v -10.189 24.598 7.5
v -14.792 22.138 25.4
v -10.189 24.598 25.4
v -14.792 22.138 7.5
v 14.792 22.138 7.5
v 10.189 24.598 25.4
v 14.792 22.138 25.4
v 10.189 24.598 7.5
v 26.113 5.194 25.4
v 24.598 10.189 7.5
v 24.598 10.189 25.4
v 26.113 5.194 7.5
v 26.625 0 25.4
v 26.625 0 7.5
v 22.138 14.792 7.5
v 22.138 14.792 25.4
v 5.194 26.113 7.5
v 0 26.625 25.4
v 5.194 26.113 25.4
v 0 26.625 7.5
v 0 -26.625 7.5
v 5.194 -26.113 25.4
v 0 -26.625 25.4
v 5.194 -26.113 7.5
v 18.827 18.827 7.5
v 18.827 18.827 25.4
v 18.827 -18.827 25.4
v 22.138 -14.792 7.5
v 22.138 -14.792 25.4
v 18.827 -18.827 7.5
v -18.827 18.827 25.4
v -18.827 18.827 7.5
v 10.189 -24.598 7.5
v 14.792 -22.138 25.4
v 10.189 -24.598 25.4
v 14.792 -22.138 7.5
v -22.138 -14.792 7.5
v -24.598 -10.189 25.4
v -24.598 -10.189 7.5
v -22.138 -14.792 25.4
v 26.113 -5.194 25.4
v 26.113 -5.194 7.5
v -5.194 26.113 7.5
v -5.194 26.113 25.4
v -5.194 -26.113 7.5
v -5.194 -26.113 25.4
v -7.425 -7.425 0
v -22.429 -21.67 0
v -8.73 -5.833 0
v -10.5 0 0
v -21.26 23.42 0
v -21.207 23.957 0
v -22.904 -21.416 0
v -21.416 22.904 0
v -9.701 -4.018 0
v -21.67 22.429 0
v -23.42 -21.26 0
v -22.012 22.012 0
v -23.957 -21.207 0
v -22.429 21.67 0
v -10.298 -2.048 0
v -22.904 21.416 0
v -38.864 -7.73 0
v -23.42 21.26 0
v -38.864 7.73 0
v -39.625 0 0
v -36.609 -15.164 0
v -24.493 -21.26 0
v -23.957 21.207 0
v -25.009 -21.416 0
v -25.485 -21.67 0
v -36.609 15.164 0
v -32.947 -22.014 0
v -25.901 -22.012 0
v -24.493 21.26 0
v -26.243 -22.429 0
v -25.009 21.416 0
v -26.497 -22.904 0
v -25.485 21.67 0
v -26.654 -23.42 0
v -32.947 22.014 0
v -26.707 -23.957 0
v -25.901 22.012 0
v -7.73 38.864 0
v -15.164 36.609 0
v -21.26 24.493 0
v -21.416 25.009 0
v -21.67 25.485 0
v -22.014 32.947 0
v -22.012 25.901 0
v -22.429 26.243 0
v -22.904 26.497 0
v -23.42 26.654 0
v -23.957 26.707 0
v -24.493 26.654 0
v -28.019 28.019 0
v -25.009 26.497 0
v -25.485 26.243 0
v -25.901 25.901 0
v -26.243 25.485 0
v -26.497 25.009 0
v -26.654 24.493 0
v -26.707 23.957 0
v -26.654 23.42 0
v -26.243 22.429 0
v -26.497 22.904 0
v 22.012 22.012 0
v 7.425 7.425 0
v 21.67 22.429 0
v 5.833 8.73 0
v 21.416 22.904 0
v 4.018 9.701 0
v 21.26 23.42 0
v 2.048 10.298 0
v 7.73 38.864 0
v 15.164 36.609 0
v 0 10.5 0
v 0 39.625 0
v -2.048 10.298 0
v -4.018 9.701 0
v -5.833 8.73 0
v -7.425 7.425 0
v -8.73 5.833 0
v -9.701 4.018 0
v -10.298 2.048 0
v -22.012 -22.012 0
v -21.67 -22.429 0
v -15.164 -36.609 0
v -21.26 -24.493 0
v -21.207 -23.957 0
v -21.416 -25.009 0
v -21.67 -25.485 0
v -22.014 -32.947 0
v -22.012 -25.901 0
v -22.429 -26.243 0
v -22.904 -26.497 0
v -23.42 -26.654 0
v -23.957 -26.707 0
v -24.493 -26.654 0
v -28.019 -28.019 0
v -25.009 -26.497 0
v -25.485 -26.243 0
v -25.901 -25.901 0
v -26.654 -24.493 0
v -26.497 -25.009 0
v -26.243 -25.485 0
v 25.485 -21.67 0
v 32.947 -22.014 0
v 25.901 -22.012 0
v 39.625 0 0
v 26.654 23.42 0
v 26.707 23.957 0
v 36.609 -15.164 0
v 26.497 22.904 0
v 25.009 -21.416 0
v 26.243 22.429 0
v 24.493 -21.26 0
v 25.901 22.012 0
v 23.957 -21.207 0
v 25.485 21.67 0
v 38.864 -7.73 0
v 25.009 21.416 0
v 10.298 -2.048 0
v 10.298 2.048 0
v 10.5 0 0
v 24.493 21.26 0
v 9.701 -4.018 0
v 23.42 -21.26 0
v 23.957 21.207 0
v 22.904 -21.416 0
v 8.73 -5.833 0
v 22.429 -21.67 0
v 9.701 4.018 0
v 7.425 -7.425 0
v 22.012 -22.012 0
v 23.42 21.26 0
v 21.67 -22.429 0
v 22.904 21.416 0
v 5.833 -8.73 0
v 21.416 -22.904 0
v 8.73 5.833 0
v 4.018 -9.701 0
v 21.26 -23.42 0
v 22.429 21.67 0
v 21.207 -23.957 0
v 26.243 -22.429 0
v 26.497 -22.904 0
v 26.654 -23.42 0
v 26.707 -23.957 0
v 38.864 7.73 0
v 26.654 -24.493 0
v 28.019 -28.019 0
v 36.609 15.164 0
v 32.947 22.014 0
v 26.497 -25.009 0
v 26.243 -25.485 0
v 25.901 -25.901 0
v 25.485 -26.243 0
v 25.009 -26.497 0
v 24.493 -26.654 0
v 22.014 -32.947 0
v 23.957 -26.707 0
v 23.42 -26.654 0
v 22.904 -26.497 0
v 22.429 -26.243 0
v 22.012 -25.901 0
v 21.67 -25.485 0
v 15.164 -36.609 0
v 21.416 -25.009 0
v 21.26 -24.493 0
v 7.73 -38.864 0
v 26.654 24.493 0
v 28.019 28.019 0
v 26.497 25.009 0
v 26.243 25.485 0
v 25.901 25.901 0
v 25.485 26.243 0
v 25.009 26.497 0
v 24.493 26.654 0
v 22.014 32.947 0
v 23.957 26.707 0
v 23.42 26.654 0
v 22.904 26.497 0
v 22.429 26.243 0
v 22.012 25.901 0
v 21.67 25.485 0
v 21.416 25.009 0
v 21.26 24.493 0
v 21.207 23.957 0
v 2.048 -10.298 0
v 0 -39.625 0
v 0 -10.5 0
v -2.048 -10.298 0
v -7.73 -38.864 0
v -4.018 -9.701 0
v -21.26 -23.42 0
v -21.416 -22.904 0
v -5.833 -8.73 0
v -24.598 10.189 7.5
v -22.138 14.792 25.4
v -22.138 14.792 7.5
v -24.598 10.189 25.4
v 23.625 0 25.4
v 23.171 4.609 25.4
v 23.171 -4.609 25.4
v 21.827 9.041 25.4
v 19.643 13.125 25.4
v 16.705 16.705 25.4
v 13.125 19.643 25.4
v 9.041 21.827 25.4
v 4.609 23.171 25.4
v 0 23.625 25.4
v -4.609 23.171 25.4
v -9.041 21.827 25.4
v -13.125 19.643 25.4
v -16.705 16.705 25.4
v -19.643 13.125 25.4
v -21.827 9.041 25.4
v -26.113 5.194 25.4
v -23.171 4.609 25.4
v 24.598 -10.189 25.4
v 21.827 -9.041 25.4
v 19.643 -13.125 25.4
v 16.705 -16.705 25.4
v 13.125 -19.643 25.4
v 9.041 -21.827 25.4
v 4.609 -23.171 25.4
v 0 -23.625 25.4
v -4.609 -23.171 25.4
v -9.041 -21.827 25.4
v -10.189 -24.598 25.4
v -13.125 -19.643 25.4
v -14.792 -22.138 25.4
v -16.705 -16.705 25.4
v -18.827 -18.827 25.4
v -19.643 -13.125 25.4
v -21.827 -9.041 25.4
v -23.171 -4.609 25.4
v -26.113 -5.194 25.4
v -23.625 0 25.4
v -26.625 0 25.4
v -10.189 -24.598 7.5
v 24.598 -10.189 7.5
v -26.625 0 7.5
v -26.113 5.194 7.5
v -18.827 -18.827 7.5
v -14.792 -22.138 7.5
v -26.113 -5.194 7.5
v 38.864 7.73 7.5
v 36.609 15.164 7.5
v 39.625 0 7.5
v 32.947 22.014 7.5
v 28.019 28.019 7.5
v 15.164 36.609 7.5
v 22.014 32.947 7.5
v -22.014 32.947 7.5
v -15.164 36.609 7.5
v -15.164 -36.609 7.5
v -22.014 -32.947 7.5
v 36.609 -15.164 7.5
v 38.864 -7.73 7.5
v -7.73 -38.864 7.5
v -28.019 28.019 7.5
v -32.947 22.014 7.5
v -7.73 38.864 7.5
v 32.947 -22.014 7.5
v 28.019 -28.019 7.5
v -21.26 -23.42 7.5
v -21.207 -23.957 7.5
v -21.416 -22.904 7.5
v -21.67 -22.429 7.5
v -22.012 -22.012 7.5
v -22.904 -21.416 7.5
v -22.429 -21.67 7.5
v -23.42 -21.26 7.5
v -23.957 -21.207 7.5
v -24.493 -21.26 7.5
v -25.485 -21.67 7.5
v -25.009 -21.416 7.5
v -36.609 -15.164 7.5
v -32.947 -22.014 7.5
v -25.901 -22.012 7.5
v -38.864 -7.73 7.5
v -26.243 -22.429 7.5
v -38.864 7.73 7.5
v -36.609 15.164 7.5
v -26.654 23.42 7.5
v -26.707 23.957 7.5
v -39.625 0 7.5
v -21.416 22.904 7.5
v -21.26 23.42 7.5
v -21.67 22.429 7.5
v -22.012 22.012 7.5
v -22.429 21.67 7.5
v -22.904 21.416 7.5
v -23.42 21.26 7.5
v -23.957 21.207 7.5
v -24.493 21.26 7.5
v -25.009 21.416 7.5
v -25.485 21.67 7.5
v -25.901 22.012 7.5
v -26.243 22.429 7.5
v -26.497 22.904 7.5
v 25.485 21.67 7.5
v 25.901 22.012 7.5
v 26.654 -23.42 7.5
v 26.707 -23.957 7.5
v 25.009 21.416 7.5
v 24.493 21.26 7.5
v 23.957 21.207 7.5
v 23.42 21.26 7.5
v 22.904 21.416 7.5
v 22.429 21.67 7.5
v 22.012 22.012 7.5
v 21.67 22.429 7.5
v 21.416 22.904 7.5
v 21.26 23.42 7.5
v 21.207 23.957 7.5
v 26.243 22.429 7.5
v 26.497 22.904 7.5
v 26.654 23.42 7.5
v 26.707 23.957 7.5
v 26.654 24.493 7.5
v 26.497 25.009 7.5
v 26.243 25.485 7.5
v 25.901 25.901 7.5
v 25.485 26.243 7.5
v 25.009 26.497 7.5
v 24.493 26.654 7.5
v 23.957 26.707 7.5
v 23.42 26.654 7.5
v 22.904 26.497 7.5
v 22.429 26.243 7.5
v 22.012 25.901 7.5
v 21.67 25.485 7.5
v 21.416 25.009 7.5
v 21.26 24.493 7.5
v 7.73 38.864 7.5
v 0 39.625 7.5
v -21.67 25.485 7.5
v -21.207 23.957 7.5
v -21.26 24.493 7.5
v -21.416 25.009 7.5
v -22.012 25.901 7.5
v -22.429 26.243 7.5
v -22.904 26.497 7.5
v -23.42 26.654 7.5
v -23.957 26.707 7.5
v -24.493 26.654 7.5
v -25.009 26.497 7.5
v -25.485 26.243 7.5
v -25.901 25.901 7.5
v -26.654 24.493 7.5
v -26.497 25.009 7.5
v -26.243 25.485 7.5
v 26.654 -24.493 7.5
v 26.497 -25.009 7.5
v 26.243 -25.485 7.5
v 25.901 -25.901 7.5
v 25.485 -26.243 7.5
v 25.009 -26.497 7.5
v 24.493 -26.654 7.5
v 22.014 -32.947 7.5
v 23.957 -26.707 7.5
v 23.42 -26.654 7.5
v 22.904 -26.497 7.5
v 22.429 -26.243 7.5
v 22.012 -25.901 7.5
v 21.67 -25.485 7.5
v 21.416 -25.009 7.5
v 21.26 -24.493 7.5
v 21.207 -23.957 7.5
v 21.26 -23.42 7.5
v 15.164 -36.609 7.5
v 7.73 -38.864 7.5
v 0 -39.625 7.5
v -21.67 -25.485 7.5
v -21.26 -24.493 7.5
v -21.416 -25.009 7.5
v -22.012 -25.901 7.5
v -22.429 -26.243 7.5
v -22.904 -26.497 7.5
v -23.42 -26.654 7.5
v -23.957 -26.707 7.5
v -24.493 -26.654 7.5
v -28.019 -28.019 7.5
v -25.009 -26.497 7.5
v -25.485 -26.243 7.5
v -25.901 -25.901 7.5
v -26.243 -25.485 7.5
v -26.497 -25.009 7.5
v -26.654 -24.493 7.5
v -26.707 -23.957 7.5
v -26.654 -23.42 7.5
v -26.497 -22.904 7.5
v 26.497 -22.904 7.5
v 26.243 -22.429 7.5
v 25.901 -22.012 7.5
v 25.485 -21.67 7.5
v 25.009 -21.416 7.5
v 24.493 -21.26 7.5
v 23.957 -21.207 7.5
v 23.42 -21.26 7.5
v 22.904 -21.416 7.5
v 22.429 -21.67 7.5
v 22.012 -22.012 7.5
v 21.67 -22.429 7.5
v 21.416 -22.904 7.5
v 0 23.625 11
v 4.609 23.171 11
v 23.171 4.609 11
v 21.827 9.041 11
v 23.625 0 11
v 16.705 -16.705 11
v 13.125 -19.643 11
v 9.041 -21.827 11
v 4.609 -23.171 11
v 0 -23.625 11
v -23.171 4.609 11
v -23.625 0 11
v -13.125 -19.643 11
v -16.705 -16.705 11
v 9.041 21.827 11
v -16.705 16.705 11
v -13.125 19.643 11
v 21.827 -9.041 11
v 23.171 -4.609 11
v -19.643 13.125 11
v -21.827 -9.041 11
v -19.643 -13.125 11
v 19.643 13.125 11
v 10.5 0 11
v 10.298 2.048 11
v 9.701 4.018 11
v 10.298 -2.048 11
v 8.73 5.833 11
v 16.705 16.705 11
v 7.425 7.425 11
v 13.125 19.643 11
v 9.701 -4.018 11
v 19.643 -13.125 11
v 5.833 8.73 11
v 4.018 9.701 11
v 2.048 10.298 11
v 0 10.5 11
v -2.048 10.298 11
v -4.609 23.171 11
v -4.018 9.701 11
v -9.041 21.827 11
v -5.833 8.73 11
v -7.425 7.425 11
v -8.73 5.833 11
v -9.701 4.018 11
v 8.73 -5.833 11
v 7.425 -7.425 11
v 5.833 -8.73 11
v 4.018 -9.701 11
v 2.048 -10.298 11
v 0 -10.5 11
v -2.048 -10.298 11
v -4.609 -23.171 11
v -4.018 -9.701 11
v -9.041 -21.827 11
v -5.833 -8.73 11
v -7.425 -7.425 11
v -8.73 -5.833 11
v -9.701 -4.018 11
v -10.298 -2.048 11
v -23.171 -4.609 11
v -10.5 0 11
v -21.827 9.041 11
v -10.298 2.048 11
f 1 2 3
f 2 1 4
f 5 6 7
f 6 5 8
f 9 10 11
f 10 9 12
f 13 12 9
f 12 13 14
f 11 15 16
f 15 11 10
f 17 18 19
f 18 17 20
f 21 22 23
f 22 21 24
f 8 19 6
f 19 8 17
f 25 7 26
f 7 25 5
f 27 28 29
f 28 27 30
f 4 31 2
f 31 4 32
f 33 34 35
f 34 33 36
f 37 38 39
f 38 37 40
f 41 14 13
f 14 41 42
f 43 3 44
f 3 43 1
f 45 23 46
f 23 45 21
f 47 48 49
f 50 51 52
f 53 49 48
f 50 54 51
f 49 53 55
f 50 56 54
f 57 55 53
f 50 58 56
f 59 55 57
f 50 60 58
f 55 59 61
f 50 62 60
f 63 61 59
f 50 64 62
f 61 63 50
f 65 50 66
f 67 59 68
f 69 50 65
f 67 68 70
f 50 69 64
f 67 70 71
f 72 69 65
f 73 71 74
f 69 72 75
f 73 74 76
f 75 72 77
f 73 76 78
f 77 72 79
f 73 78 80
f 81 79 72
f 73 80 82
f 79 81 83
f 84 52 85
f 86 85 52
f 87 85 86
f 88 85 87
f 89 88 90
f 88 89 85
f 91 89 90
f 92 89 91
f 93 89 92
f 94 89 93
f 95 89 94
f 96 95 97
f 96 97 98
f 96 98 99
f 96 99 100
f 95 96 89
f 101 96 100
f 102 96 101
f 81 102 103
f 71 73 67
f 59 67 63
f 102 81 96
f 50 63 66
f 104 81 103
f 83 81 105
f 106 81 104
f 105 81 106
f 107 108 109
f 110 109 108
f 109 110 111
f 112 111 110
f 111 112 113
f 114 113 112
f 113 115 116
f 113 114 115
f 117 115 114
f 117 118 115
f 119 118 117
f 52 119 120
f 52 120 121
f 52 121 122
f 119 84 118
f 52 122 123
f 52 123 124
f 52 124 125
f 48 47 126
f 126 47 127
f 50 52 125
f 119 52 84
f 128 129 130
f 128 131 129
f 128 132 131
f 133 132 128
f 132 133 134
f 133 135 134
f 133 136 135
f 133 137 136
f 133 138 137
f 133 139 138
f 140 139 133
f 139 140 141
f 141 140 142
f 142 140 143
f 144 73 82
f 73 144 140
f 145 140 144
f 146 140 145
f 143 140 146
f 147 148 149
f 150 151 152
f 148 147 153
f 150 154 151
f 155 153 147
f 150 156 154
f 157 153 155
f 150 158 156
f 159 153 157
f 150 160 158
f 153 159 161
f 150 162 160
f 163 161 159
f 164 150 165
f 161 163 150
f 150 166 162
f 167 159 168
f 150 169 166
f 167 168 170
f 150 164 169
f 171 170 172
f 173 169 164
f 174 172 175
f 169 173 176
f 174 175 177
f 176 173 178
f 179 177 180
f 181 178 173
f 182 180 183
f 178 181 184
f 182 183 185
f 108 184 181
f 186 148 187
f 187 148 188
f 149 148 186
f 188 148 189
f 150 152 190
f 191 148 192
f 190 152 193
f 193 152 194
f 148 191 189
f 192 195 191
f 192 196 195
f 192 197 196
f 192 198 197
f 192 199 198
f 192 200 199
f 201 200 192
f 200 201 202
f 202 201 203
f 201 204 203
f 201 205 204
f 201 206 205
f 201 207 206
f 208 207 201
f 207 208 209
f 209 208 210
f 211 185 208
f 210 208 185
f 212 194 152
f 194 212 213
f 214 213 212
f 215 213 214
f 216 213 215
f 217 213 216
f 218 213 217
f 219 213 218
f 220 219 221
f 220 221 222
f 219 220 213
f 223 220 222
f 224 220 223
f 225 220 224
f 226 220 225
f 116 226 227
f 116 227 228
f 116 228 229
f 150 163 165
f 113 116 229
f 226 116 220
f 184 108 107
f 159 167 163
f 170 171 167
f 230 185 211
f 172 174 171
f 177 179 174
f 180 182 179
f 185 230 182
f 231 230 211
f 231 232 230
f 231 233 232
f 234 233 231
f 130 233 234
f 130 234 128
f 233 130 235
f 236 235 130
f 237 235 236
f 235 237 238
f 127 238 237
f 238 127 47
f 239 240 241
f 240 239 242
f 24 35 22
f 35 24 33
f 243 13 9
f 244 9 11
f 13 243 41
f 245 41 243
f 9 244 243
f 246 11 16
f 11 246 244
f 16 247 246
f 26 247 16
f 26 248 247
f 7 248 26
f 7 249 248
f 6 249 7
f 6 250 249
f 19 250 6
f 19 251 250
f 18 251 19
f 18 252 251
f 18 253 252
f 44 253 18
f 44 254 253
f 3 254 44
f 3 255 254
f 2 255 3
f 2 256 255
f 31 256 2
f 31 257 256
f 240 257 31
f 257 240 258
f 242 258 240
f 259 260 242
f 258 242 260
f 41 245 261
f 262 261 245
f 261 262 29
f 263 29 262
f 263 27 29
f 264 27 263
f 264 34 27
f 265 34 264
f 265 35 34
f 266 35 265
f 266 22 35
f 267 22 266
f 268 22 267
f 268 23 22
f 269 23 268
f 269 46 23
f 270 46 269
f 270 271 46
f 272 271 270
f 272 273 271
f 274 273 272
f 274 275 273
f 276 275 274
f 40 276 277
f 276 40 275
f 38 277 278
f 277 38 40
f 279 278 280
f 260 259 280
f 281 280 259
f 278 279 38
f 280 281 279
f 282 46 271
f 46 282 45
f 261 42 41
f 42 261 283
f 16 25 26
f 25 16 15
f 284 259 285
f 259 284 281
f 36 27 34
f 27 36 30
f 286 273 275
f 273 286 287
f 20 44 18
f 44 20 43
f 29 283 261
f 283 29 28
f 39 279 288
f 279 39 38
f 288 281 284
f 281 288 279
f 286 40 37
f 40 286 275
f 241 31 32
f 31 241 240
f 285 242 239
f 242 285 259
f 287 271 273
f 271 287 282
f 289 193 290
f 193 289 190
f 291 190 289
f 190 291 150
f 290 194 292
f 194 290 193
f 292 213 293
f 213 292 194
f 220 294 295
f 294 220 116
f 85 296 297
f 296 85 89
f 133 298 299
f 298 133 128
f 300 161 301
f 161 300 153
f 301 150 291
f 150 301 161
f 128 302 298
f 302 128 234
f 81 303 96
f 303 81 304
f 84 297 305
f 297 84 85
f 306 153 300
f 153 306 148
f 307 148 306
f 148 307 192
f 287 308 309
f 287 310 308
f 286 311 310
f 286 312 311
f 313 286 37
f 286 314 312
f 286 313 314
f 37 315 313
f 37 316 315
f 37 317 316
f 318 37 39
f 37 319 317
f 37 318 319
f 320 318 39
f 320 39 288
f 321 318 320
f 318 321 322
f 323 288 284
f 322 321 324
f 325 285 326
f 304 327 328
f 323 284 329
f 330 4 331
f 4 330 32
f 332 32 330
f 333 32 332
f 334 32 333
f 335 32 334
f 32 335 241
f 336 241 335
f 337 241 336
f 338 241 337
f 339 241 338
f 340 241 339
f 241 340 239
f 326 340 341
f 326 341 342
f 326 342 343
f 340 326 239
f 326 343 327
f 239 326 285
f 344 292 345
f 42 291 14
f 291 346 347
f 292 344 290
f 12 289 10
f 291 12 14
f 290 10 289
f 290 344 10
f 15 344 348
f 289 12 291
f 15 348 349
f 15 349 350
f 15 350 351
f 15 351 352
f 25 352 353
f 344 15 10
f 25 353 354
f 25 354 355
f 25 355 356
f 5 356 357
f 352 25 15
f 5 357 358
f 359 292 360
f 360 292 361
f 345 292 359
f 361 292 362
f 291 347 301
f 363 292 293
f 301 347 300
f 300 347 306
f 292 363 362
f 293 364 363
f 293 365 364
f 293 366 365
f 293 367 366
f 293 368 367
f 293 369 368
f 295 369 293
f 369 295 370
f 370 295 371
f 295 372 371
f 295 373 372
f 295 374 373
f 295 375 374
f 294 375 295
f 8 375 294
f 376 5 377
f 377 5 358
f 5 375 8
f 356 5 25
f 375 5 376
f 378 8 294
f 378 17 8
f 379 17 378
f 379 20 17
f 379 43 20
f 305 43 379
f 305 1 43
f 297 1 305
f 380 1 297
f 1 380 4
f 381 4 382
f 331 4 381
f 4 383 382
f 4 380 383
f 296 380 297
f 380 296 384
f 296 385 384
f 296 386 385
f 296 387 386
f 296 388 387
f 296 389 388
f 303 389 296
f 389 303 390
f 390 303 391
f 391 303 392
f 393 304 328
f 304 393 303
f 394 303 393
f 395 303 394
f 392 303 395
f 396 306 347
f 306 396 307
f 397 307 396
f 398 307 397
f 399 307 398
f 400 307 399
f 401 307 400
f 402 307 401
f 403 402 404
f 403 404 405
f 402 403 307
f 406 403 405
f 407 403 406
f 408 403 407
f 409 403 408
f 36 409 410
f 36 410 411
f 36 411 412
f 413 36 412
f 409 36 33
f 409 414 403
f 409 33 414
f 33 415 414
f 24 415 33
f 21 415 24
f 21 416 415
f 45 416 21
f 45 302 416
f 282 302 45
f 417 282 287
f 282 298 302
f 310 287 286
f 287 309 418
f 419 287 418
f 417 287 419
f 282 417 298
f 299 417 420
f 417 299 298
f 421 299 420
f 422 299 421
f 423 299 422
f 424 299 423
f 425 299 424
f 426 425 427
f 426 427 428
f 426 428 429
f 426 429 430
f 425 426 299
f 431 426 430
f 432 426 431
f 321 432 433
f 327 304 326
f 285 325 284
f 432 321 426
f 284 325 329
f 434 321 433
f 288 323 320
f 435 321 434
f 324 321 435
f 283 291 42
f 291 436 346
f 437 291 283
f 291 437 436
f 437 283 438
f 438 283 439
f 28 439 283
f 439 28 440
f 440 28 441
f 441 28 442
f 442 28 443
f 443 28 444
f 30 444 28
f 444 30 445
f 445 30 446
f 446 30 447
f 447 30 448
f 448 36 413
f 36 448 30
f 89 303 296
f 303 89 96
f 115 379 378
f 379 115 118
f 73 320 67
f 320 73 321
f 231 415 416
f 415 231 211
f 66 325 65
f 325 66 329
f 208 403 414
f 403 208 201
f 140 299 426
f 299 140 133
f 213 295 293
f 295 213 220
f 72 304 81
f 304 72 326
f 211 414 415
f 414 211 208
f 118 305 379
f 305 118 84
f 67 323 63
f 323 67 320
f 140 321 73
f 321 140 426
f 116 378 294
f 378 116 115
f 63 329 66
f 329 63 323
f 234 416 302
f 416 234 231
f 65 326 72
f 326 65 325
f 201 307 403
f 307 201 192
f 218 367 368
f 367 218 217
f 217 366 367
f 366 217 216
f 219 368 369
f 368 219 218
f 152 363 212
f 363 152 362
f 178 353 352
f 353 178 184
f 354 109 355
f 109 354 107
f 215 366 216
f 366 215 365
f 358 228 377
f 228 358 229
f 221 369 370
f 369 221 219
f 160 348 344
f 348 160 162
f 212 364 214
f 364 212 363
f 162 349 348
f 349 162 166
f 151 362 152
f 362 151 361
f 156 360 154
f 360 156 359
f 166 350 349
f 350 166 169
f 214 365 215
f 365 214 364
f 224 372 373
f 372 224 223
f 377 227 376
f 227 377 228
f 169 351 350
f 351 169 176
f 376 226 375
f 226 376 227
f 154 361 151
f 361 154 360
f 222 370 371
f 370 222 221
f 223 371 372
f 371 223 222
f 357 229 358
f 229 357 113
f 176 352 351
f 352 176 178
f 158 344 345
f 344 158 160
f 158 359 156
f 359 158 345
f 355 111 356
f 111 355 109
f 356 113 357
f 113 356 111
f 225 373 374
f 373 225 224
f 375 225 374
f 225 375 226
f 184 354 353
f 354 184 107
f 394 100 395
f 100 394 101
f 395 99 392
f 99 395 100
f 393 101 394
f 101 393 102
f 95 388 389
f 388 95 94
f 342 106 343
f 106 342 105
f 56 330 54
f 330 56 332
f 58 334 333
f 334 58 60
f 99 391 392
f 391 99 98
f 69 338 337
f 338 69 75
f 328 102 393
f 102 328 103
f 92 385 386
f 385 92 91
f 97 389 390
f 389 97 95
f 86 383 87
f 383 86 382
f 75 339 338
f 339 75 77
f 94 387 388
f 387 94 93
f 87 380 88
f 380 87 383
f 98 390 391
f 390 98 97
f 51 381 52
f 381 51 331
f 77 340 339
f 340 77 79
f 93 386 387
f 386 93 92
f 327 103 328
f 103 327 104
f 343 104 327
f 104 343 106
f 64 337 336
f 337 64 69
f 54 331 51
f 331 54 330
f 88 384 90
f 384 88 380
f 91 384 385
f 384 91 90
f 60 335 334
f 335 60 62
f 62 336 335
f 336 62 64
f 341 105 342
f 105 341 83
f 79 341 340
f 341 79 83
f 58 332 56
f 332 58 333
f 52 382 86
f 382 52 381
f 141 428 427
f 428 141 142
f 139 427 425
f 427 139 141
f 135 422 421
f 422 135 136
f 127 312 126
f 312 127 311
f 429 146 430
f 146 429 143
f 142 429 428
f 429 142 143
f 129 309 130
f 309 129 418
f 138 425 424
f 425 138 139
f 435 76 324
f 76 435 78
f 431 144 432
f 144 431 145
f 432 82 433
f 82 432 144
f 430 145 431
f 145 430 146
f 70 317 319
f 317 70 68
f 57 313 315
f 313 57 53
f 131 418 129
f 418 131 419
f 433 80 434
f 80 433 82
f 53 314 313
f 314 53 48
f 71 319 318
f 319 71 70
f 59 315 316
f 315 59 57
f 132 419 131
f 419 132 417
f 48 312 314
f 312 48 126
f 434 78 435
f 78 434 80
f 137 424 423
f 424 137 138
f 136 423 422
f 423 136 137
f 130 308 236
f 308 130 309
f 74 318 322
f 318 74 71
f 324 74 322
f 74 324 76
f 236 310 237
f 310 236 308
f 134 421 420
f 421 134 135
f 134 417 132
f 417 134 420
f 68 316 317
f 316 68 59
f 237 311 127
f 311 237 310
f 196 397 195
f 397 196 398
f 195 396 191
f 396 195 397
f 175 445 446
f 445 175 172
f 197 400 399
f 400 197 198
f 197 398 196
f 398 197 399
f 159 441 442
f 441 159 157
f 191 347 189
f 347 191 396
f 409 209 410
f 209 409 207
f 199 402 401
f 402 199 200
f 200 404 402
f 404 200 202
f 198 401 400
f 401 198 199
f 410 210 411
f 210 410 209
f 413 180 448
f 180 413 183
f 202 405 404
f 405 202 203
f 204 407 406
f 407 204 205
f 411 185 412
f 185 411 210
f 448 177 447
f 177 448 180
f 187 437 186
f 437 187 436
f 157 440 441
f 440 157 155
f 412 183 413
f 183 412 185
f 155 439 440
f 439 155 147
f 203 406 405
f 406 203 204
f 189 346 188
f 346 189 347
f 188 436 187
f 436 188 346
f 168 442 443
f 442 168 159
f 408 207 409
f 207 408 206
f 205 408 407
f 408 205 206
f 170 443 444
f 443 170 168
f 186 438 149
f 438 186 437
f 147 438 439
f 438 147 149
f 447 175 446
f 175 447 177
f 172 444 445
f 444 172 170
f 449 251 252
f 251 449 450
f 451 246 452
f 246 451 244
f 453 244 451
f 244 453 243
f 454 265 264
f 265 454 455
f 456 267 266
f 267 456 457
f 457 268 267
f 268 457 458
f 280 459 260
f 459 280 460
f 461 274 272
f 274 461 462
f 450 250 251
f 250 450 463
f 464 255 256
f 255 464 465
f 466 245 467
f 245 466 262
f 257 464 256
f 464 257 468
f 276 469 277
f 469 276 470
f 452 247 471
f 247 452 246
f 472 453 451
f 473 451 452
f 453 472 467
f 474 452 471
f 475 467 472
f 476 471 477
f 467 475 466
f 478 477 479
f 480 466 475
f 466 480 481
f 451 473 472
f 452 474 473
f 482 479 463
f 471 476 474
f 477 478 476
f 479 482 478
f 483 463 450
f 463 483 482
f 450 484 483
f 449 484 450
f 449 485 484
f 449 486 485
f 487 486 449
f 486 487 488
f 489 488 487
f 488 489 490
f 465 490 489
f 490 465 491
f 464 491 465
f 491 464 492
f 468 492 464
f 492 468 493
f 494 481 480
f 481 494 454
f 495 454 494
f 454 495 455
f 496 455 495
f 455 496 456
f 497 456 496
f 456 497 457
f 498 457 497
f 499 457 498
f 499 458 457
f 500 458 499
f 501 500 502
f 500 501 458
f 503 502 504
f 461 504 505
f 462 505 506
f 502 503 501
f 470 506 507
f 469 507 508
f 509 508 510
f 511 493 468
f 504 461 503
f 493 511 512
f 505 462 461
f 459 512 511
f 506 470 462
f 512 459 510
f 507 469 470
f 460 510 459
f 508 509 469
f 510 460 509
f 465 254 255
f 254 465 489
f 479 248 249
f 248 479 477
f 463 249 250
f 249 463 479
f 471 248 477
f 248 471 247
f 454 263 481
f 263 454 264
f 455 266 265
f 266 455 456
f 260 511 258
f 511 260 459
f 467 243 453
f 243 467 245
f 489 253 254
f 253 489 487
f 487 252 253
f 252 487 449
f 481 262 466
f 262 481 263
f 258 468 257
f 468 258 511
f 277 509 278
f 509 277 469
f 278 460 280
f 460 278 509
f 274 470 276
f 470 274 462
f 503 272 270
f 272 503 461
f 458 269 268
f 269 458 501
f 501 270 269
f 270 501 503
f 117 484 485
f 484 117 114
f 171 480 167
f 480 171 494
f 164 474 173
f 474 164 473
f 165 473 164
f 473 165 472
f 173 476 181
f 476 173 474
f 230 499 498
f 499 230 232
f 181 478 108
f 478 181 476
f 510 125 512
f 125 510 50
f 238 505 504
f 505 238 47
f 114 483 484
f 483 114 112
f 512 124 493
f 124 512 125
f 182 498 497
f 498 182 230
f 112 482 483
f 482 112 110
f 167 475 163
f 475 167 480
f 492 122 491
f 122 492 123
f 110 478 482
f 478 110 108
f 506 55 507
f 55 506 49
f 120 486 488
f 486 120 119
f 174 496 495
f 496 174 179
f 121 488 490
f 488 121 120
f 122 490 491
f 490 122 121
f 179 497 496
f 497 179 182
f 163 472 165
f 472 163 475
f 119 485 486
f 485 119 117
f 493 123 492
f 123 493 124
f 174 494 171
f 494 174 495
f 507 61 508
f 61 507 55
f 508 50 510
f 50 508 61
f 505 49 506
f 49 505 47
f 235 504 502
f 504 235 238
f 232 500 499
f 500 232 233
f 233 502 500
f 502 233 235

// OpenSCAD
$fn = 32;

// ----------------------------------------------------------------------
// Bearing housing: seat for 6204 (47 x 14 mm), 53.25 mm body
// ----------------------------------------------------------------------

// --- parameters (mm) ---
body_od = 53.25;          // housing outside diameter
body_h = 25.4;            // overall housing height
wall = 3;                 // wall thickness
pocket_d = 47.25;         // 6204 seat, 0.25 mm clearance
seat_h = 14.4;            // pocket depth
shoulder = 5;             // shoulder under the bearing
pass_d = 21;              // shaft passage
flange_dia = 79.25;       // mounting flange diameter
flange_t = 6;             // flange thickness
bolt_d = 5.5;             // flange bolt clearance
bolt_r = 33.88;           // flange bolt circle radius

module body() {
  cylinder(h = body_h, d = body_od);
}

module flange() {
  /* flange sunk 1.5 mm into the body */
  cylinder(h = flange_t + 1.5, d = flange_dia);
}

difference() {
  union() {
    body();
    flange();
  }
  translate([0, 0, body_h - seat_h]) cylinder(h = seat_h + 1, d = pocket_d);
  translate([0, 0, -1]) cylinder(h = body_h - seat_h + 1, d = pass_d);
  for (i = [0 : 3]) rotate([0, 0, 45 + i * 90]) translate([bolt_r, 0, -1])
    cylinder(h = flange_t + 3, d = bolt_d);
}
